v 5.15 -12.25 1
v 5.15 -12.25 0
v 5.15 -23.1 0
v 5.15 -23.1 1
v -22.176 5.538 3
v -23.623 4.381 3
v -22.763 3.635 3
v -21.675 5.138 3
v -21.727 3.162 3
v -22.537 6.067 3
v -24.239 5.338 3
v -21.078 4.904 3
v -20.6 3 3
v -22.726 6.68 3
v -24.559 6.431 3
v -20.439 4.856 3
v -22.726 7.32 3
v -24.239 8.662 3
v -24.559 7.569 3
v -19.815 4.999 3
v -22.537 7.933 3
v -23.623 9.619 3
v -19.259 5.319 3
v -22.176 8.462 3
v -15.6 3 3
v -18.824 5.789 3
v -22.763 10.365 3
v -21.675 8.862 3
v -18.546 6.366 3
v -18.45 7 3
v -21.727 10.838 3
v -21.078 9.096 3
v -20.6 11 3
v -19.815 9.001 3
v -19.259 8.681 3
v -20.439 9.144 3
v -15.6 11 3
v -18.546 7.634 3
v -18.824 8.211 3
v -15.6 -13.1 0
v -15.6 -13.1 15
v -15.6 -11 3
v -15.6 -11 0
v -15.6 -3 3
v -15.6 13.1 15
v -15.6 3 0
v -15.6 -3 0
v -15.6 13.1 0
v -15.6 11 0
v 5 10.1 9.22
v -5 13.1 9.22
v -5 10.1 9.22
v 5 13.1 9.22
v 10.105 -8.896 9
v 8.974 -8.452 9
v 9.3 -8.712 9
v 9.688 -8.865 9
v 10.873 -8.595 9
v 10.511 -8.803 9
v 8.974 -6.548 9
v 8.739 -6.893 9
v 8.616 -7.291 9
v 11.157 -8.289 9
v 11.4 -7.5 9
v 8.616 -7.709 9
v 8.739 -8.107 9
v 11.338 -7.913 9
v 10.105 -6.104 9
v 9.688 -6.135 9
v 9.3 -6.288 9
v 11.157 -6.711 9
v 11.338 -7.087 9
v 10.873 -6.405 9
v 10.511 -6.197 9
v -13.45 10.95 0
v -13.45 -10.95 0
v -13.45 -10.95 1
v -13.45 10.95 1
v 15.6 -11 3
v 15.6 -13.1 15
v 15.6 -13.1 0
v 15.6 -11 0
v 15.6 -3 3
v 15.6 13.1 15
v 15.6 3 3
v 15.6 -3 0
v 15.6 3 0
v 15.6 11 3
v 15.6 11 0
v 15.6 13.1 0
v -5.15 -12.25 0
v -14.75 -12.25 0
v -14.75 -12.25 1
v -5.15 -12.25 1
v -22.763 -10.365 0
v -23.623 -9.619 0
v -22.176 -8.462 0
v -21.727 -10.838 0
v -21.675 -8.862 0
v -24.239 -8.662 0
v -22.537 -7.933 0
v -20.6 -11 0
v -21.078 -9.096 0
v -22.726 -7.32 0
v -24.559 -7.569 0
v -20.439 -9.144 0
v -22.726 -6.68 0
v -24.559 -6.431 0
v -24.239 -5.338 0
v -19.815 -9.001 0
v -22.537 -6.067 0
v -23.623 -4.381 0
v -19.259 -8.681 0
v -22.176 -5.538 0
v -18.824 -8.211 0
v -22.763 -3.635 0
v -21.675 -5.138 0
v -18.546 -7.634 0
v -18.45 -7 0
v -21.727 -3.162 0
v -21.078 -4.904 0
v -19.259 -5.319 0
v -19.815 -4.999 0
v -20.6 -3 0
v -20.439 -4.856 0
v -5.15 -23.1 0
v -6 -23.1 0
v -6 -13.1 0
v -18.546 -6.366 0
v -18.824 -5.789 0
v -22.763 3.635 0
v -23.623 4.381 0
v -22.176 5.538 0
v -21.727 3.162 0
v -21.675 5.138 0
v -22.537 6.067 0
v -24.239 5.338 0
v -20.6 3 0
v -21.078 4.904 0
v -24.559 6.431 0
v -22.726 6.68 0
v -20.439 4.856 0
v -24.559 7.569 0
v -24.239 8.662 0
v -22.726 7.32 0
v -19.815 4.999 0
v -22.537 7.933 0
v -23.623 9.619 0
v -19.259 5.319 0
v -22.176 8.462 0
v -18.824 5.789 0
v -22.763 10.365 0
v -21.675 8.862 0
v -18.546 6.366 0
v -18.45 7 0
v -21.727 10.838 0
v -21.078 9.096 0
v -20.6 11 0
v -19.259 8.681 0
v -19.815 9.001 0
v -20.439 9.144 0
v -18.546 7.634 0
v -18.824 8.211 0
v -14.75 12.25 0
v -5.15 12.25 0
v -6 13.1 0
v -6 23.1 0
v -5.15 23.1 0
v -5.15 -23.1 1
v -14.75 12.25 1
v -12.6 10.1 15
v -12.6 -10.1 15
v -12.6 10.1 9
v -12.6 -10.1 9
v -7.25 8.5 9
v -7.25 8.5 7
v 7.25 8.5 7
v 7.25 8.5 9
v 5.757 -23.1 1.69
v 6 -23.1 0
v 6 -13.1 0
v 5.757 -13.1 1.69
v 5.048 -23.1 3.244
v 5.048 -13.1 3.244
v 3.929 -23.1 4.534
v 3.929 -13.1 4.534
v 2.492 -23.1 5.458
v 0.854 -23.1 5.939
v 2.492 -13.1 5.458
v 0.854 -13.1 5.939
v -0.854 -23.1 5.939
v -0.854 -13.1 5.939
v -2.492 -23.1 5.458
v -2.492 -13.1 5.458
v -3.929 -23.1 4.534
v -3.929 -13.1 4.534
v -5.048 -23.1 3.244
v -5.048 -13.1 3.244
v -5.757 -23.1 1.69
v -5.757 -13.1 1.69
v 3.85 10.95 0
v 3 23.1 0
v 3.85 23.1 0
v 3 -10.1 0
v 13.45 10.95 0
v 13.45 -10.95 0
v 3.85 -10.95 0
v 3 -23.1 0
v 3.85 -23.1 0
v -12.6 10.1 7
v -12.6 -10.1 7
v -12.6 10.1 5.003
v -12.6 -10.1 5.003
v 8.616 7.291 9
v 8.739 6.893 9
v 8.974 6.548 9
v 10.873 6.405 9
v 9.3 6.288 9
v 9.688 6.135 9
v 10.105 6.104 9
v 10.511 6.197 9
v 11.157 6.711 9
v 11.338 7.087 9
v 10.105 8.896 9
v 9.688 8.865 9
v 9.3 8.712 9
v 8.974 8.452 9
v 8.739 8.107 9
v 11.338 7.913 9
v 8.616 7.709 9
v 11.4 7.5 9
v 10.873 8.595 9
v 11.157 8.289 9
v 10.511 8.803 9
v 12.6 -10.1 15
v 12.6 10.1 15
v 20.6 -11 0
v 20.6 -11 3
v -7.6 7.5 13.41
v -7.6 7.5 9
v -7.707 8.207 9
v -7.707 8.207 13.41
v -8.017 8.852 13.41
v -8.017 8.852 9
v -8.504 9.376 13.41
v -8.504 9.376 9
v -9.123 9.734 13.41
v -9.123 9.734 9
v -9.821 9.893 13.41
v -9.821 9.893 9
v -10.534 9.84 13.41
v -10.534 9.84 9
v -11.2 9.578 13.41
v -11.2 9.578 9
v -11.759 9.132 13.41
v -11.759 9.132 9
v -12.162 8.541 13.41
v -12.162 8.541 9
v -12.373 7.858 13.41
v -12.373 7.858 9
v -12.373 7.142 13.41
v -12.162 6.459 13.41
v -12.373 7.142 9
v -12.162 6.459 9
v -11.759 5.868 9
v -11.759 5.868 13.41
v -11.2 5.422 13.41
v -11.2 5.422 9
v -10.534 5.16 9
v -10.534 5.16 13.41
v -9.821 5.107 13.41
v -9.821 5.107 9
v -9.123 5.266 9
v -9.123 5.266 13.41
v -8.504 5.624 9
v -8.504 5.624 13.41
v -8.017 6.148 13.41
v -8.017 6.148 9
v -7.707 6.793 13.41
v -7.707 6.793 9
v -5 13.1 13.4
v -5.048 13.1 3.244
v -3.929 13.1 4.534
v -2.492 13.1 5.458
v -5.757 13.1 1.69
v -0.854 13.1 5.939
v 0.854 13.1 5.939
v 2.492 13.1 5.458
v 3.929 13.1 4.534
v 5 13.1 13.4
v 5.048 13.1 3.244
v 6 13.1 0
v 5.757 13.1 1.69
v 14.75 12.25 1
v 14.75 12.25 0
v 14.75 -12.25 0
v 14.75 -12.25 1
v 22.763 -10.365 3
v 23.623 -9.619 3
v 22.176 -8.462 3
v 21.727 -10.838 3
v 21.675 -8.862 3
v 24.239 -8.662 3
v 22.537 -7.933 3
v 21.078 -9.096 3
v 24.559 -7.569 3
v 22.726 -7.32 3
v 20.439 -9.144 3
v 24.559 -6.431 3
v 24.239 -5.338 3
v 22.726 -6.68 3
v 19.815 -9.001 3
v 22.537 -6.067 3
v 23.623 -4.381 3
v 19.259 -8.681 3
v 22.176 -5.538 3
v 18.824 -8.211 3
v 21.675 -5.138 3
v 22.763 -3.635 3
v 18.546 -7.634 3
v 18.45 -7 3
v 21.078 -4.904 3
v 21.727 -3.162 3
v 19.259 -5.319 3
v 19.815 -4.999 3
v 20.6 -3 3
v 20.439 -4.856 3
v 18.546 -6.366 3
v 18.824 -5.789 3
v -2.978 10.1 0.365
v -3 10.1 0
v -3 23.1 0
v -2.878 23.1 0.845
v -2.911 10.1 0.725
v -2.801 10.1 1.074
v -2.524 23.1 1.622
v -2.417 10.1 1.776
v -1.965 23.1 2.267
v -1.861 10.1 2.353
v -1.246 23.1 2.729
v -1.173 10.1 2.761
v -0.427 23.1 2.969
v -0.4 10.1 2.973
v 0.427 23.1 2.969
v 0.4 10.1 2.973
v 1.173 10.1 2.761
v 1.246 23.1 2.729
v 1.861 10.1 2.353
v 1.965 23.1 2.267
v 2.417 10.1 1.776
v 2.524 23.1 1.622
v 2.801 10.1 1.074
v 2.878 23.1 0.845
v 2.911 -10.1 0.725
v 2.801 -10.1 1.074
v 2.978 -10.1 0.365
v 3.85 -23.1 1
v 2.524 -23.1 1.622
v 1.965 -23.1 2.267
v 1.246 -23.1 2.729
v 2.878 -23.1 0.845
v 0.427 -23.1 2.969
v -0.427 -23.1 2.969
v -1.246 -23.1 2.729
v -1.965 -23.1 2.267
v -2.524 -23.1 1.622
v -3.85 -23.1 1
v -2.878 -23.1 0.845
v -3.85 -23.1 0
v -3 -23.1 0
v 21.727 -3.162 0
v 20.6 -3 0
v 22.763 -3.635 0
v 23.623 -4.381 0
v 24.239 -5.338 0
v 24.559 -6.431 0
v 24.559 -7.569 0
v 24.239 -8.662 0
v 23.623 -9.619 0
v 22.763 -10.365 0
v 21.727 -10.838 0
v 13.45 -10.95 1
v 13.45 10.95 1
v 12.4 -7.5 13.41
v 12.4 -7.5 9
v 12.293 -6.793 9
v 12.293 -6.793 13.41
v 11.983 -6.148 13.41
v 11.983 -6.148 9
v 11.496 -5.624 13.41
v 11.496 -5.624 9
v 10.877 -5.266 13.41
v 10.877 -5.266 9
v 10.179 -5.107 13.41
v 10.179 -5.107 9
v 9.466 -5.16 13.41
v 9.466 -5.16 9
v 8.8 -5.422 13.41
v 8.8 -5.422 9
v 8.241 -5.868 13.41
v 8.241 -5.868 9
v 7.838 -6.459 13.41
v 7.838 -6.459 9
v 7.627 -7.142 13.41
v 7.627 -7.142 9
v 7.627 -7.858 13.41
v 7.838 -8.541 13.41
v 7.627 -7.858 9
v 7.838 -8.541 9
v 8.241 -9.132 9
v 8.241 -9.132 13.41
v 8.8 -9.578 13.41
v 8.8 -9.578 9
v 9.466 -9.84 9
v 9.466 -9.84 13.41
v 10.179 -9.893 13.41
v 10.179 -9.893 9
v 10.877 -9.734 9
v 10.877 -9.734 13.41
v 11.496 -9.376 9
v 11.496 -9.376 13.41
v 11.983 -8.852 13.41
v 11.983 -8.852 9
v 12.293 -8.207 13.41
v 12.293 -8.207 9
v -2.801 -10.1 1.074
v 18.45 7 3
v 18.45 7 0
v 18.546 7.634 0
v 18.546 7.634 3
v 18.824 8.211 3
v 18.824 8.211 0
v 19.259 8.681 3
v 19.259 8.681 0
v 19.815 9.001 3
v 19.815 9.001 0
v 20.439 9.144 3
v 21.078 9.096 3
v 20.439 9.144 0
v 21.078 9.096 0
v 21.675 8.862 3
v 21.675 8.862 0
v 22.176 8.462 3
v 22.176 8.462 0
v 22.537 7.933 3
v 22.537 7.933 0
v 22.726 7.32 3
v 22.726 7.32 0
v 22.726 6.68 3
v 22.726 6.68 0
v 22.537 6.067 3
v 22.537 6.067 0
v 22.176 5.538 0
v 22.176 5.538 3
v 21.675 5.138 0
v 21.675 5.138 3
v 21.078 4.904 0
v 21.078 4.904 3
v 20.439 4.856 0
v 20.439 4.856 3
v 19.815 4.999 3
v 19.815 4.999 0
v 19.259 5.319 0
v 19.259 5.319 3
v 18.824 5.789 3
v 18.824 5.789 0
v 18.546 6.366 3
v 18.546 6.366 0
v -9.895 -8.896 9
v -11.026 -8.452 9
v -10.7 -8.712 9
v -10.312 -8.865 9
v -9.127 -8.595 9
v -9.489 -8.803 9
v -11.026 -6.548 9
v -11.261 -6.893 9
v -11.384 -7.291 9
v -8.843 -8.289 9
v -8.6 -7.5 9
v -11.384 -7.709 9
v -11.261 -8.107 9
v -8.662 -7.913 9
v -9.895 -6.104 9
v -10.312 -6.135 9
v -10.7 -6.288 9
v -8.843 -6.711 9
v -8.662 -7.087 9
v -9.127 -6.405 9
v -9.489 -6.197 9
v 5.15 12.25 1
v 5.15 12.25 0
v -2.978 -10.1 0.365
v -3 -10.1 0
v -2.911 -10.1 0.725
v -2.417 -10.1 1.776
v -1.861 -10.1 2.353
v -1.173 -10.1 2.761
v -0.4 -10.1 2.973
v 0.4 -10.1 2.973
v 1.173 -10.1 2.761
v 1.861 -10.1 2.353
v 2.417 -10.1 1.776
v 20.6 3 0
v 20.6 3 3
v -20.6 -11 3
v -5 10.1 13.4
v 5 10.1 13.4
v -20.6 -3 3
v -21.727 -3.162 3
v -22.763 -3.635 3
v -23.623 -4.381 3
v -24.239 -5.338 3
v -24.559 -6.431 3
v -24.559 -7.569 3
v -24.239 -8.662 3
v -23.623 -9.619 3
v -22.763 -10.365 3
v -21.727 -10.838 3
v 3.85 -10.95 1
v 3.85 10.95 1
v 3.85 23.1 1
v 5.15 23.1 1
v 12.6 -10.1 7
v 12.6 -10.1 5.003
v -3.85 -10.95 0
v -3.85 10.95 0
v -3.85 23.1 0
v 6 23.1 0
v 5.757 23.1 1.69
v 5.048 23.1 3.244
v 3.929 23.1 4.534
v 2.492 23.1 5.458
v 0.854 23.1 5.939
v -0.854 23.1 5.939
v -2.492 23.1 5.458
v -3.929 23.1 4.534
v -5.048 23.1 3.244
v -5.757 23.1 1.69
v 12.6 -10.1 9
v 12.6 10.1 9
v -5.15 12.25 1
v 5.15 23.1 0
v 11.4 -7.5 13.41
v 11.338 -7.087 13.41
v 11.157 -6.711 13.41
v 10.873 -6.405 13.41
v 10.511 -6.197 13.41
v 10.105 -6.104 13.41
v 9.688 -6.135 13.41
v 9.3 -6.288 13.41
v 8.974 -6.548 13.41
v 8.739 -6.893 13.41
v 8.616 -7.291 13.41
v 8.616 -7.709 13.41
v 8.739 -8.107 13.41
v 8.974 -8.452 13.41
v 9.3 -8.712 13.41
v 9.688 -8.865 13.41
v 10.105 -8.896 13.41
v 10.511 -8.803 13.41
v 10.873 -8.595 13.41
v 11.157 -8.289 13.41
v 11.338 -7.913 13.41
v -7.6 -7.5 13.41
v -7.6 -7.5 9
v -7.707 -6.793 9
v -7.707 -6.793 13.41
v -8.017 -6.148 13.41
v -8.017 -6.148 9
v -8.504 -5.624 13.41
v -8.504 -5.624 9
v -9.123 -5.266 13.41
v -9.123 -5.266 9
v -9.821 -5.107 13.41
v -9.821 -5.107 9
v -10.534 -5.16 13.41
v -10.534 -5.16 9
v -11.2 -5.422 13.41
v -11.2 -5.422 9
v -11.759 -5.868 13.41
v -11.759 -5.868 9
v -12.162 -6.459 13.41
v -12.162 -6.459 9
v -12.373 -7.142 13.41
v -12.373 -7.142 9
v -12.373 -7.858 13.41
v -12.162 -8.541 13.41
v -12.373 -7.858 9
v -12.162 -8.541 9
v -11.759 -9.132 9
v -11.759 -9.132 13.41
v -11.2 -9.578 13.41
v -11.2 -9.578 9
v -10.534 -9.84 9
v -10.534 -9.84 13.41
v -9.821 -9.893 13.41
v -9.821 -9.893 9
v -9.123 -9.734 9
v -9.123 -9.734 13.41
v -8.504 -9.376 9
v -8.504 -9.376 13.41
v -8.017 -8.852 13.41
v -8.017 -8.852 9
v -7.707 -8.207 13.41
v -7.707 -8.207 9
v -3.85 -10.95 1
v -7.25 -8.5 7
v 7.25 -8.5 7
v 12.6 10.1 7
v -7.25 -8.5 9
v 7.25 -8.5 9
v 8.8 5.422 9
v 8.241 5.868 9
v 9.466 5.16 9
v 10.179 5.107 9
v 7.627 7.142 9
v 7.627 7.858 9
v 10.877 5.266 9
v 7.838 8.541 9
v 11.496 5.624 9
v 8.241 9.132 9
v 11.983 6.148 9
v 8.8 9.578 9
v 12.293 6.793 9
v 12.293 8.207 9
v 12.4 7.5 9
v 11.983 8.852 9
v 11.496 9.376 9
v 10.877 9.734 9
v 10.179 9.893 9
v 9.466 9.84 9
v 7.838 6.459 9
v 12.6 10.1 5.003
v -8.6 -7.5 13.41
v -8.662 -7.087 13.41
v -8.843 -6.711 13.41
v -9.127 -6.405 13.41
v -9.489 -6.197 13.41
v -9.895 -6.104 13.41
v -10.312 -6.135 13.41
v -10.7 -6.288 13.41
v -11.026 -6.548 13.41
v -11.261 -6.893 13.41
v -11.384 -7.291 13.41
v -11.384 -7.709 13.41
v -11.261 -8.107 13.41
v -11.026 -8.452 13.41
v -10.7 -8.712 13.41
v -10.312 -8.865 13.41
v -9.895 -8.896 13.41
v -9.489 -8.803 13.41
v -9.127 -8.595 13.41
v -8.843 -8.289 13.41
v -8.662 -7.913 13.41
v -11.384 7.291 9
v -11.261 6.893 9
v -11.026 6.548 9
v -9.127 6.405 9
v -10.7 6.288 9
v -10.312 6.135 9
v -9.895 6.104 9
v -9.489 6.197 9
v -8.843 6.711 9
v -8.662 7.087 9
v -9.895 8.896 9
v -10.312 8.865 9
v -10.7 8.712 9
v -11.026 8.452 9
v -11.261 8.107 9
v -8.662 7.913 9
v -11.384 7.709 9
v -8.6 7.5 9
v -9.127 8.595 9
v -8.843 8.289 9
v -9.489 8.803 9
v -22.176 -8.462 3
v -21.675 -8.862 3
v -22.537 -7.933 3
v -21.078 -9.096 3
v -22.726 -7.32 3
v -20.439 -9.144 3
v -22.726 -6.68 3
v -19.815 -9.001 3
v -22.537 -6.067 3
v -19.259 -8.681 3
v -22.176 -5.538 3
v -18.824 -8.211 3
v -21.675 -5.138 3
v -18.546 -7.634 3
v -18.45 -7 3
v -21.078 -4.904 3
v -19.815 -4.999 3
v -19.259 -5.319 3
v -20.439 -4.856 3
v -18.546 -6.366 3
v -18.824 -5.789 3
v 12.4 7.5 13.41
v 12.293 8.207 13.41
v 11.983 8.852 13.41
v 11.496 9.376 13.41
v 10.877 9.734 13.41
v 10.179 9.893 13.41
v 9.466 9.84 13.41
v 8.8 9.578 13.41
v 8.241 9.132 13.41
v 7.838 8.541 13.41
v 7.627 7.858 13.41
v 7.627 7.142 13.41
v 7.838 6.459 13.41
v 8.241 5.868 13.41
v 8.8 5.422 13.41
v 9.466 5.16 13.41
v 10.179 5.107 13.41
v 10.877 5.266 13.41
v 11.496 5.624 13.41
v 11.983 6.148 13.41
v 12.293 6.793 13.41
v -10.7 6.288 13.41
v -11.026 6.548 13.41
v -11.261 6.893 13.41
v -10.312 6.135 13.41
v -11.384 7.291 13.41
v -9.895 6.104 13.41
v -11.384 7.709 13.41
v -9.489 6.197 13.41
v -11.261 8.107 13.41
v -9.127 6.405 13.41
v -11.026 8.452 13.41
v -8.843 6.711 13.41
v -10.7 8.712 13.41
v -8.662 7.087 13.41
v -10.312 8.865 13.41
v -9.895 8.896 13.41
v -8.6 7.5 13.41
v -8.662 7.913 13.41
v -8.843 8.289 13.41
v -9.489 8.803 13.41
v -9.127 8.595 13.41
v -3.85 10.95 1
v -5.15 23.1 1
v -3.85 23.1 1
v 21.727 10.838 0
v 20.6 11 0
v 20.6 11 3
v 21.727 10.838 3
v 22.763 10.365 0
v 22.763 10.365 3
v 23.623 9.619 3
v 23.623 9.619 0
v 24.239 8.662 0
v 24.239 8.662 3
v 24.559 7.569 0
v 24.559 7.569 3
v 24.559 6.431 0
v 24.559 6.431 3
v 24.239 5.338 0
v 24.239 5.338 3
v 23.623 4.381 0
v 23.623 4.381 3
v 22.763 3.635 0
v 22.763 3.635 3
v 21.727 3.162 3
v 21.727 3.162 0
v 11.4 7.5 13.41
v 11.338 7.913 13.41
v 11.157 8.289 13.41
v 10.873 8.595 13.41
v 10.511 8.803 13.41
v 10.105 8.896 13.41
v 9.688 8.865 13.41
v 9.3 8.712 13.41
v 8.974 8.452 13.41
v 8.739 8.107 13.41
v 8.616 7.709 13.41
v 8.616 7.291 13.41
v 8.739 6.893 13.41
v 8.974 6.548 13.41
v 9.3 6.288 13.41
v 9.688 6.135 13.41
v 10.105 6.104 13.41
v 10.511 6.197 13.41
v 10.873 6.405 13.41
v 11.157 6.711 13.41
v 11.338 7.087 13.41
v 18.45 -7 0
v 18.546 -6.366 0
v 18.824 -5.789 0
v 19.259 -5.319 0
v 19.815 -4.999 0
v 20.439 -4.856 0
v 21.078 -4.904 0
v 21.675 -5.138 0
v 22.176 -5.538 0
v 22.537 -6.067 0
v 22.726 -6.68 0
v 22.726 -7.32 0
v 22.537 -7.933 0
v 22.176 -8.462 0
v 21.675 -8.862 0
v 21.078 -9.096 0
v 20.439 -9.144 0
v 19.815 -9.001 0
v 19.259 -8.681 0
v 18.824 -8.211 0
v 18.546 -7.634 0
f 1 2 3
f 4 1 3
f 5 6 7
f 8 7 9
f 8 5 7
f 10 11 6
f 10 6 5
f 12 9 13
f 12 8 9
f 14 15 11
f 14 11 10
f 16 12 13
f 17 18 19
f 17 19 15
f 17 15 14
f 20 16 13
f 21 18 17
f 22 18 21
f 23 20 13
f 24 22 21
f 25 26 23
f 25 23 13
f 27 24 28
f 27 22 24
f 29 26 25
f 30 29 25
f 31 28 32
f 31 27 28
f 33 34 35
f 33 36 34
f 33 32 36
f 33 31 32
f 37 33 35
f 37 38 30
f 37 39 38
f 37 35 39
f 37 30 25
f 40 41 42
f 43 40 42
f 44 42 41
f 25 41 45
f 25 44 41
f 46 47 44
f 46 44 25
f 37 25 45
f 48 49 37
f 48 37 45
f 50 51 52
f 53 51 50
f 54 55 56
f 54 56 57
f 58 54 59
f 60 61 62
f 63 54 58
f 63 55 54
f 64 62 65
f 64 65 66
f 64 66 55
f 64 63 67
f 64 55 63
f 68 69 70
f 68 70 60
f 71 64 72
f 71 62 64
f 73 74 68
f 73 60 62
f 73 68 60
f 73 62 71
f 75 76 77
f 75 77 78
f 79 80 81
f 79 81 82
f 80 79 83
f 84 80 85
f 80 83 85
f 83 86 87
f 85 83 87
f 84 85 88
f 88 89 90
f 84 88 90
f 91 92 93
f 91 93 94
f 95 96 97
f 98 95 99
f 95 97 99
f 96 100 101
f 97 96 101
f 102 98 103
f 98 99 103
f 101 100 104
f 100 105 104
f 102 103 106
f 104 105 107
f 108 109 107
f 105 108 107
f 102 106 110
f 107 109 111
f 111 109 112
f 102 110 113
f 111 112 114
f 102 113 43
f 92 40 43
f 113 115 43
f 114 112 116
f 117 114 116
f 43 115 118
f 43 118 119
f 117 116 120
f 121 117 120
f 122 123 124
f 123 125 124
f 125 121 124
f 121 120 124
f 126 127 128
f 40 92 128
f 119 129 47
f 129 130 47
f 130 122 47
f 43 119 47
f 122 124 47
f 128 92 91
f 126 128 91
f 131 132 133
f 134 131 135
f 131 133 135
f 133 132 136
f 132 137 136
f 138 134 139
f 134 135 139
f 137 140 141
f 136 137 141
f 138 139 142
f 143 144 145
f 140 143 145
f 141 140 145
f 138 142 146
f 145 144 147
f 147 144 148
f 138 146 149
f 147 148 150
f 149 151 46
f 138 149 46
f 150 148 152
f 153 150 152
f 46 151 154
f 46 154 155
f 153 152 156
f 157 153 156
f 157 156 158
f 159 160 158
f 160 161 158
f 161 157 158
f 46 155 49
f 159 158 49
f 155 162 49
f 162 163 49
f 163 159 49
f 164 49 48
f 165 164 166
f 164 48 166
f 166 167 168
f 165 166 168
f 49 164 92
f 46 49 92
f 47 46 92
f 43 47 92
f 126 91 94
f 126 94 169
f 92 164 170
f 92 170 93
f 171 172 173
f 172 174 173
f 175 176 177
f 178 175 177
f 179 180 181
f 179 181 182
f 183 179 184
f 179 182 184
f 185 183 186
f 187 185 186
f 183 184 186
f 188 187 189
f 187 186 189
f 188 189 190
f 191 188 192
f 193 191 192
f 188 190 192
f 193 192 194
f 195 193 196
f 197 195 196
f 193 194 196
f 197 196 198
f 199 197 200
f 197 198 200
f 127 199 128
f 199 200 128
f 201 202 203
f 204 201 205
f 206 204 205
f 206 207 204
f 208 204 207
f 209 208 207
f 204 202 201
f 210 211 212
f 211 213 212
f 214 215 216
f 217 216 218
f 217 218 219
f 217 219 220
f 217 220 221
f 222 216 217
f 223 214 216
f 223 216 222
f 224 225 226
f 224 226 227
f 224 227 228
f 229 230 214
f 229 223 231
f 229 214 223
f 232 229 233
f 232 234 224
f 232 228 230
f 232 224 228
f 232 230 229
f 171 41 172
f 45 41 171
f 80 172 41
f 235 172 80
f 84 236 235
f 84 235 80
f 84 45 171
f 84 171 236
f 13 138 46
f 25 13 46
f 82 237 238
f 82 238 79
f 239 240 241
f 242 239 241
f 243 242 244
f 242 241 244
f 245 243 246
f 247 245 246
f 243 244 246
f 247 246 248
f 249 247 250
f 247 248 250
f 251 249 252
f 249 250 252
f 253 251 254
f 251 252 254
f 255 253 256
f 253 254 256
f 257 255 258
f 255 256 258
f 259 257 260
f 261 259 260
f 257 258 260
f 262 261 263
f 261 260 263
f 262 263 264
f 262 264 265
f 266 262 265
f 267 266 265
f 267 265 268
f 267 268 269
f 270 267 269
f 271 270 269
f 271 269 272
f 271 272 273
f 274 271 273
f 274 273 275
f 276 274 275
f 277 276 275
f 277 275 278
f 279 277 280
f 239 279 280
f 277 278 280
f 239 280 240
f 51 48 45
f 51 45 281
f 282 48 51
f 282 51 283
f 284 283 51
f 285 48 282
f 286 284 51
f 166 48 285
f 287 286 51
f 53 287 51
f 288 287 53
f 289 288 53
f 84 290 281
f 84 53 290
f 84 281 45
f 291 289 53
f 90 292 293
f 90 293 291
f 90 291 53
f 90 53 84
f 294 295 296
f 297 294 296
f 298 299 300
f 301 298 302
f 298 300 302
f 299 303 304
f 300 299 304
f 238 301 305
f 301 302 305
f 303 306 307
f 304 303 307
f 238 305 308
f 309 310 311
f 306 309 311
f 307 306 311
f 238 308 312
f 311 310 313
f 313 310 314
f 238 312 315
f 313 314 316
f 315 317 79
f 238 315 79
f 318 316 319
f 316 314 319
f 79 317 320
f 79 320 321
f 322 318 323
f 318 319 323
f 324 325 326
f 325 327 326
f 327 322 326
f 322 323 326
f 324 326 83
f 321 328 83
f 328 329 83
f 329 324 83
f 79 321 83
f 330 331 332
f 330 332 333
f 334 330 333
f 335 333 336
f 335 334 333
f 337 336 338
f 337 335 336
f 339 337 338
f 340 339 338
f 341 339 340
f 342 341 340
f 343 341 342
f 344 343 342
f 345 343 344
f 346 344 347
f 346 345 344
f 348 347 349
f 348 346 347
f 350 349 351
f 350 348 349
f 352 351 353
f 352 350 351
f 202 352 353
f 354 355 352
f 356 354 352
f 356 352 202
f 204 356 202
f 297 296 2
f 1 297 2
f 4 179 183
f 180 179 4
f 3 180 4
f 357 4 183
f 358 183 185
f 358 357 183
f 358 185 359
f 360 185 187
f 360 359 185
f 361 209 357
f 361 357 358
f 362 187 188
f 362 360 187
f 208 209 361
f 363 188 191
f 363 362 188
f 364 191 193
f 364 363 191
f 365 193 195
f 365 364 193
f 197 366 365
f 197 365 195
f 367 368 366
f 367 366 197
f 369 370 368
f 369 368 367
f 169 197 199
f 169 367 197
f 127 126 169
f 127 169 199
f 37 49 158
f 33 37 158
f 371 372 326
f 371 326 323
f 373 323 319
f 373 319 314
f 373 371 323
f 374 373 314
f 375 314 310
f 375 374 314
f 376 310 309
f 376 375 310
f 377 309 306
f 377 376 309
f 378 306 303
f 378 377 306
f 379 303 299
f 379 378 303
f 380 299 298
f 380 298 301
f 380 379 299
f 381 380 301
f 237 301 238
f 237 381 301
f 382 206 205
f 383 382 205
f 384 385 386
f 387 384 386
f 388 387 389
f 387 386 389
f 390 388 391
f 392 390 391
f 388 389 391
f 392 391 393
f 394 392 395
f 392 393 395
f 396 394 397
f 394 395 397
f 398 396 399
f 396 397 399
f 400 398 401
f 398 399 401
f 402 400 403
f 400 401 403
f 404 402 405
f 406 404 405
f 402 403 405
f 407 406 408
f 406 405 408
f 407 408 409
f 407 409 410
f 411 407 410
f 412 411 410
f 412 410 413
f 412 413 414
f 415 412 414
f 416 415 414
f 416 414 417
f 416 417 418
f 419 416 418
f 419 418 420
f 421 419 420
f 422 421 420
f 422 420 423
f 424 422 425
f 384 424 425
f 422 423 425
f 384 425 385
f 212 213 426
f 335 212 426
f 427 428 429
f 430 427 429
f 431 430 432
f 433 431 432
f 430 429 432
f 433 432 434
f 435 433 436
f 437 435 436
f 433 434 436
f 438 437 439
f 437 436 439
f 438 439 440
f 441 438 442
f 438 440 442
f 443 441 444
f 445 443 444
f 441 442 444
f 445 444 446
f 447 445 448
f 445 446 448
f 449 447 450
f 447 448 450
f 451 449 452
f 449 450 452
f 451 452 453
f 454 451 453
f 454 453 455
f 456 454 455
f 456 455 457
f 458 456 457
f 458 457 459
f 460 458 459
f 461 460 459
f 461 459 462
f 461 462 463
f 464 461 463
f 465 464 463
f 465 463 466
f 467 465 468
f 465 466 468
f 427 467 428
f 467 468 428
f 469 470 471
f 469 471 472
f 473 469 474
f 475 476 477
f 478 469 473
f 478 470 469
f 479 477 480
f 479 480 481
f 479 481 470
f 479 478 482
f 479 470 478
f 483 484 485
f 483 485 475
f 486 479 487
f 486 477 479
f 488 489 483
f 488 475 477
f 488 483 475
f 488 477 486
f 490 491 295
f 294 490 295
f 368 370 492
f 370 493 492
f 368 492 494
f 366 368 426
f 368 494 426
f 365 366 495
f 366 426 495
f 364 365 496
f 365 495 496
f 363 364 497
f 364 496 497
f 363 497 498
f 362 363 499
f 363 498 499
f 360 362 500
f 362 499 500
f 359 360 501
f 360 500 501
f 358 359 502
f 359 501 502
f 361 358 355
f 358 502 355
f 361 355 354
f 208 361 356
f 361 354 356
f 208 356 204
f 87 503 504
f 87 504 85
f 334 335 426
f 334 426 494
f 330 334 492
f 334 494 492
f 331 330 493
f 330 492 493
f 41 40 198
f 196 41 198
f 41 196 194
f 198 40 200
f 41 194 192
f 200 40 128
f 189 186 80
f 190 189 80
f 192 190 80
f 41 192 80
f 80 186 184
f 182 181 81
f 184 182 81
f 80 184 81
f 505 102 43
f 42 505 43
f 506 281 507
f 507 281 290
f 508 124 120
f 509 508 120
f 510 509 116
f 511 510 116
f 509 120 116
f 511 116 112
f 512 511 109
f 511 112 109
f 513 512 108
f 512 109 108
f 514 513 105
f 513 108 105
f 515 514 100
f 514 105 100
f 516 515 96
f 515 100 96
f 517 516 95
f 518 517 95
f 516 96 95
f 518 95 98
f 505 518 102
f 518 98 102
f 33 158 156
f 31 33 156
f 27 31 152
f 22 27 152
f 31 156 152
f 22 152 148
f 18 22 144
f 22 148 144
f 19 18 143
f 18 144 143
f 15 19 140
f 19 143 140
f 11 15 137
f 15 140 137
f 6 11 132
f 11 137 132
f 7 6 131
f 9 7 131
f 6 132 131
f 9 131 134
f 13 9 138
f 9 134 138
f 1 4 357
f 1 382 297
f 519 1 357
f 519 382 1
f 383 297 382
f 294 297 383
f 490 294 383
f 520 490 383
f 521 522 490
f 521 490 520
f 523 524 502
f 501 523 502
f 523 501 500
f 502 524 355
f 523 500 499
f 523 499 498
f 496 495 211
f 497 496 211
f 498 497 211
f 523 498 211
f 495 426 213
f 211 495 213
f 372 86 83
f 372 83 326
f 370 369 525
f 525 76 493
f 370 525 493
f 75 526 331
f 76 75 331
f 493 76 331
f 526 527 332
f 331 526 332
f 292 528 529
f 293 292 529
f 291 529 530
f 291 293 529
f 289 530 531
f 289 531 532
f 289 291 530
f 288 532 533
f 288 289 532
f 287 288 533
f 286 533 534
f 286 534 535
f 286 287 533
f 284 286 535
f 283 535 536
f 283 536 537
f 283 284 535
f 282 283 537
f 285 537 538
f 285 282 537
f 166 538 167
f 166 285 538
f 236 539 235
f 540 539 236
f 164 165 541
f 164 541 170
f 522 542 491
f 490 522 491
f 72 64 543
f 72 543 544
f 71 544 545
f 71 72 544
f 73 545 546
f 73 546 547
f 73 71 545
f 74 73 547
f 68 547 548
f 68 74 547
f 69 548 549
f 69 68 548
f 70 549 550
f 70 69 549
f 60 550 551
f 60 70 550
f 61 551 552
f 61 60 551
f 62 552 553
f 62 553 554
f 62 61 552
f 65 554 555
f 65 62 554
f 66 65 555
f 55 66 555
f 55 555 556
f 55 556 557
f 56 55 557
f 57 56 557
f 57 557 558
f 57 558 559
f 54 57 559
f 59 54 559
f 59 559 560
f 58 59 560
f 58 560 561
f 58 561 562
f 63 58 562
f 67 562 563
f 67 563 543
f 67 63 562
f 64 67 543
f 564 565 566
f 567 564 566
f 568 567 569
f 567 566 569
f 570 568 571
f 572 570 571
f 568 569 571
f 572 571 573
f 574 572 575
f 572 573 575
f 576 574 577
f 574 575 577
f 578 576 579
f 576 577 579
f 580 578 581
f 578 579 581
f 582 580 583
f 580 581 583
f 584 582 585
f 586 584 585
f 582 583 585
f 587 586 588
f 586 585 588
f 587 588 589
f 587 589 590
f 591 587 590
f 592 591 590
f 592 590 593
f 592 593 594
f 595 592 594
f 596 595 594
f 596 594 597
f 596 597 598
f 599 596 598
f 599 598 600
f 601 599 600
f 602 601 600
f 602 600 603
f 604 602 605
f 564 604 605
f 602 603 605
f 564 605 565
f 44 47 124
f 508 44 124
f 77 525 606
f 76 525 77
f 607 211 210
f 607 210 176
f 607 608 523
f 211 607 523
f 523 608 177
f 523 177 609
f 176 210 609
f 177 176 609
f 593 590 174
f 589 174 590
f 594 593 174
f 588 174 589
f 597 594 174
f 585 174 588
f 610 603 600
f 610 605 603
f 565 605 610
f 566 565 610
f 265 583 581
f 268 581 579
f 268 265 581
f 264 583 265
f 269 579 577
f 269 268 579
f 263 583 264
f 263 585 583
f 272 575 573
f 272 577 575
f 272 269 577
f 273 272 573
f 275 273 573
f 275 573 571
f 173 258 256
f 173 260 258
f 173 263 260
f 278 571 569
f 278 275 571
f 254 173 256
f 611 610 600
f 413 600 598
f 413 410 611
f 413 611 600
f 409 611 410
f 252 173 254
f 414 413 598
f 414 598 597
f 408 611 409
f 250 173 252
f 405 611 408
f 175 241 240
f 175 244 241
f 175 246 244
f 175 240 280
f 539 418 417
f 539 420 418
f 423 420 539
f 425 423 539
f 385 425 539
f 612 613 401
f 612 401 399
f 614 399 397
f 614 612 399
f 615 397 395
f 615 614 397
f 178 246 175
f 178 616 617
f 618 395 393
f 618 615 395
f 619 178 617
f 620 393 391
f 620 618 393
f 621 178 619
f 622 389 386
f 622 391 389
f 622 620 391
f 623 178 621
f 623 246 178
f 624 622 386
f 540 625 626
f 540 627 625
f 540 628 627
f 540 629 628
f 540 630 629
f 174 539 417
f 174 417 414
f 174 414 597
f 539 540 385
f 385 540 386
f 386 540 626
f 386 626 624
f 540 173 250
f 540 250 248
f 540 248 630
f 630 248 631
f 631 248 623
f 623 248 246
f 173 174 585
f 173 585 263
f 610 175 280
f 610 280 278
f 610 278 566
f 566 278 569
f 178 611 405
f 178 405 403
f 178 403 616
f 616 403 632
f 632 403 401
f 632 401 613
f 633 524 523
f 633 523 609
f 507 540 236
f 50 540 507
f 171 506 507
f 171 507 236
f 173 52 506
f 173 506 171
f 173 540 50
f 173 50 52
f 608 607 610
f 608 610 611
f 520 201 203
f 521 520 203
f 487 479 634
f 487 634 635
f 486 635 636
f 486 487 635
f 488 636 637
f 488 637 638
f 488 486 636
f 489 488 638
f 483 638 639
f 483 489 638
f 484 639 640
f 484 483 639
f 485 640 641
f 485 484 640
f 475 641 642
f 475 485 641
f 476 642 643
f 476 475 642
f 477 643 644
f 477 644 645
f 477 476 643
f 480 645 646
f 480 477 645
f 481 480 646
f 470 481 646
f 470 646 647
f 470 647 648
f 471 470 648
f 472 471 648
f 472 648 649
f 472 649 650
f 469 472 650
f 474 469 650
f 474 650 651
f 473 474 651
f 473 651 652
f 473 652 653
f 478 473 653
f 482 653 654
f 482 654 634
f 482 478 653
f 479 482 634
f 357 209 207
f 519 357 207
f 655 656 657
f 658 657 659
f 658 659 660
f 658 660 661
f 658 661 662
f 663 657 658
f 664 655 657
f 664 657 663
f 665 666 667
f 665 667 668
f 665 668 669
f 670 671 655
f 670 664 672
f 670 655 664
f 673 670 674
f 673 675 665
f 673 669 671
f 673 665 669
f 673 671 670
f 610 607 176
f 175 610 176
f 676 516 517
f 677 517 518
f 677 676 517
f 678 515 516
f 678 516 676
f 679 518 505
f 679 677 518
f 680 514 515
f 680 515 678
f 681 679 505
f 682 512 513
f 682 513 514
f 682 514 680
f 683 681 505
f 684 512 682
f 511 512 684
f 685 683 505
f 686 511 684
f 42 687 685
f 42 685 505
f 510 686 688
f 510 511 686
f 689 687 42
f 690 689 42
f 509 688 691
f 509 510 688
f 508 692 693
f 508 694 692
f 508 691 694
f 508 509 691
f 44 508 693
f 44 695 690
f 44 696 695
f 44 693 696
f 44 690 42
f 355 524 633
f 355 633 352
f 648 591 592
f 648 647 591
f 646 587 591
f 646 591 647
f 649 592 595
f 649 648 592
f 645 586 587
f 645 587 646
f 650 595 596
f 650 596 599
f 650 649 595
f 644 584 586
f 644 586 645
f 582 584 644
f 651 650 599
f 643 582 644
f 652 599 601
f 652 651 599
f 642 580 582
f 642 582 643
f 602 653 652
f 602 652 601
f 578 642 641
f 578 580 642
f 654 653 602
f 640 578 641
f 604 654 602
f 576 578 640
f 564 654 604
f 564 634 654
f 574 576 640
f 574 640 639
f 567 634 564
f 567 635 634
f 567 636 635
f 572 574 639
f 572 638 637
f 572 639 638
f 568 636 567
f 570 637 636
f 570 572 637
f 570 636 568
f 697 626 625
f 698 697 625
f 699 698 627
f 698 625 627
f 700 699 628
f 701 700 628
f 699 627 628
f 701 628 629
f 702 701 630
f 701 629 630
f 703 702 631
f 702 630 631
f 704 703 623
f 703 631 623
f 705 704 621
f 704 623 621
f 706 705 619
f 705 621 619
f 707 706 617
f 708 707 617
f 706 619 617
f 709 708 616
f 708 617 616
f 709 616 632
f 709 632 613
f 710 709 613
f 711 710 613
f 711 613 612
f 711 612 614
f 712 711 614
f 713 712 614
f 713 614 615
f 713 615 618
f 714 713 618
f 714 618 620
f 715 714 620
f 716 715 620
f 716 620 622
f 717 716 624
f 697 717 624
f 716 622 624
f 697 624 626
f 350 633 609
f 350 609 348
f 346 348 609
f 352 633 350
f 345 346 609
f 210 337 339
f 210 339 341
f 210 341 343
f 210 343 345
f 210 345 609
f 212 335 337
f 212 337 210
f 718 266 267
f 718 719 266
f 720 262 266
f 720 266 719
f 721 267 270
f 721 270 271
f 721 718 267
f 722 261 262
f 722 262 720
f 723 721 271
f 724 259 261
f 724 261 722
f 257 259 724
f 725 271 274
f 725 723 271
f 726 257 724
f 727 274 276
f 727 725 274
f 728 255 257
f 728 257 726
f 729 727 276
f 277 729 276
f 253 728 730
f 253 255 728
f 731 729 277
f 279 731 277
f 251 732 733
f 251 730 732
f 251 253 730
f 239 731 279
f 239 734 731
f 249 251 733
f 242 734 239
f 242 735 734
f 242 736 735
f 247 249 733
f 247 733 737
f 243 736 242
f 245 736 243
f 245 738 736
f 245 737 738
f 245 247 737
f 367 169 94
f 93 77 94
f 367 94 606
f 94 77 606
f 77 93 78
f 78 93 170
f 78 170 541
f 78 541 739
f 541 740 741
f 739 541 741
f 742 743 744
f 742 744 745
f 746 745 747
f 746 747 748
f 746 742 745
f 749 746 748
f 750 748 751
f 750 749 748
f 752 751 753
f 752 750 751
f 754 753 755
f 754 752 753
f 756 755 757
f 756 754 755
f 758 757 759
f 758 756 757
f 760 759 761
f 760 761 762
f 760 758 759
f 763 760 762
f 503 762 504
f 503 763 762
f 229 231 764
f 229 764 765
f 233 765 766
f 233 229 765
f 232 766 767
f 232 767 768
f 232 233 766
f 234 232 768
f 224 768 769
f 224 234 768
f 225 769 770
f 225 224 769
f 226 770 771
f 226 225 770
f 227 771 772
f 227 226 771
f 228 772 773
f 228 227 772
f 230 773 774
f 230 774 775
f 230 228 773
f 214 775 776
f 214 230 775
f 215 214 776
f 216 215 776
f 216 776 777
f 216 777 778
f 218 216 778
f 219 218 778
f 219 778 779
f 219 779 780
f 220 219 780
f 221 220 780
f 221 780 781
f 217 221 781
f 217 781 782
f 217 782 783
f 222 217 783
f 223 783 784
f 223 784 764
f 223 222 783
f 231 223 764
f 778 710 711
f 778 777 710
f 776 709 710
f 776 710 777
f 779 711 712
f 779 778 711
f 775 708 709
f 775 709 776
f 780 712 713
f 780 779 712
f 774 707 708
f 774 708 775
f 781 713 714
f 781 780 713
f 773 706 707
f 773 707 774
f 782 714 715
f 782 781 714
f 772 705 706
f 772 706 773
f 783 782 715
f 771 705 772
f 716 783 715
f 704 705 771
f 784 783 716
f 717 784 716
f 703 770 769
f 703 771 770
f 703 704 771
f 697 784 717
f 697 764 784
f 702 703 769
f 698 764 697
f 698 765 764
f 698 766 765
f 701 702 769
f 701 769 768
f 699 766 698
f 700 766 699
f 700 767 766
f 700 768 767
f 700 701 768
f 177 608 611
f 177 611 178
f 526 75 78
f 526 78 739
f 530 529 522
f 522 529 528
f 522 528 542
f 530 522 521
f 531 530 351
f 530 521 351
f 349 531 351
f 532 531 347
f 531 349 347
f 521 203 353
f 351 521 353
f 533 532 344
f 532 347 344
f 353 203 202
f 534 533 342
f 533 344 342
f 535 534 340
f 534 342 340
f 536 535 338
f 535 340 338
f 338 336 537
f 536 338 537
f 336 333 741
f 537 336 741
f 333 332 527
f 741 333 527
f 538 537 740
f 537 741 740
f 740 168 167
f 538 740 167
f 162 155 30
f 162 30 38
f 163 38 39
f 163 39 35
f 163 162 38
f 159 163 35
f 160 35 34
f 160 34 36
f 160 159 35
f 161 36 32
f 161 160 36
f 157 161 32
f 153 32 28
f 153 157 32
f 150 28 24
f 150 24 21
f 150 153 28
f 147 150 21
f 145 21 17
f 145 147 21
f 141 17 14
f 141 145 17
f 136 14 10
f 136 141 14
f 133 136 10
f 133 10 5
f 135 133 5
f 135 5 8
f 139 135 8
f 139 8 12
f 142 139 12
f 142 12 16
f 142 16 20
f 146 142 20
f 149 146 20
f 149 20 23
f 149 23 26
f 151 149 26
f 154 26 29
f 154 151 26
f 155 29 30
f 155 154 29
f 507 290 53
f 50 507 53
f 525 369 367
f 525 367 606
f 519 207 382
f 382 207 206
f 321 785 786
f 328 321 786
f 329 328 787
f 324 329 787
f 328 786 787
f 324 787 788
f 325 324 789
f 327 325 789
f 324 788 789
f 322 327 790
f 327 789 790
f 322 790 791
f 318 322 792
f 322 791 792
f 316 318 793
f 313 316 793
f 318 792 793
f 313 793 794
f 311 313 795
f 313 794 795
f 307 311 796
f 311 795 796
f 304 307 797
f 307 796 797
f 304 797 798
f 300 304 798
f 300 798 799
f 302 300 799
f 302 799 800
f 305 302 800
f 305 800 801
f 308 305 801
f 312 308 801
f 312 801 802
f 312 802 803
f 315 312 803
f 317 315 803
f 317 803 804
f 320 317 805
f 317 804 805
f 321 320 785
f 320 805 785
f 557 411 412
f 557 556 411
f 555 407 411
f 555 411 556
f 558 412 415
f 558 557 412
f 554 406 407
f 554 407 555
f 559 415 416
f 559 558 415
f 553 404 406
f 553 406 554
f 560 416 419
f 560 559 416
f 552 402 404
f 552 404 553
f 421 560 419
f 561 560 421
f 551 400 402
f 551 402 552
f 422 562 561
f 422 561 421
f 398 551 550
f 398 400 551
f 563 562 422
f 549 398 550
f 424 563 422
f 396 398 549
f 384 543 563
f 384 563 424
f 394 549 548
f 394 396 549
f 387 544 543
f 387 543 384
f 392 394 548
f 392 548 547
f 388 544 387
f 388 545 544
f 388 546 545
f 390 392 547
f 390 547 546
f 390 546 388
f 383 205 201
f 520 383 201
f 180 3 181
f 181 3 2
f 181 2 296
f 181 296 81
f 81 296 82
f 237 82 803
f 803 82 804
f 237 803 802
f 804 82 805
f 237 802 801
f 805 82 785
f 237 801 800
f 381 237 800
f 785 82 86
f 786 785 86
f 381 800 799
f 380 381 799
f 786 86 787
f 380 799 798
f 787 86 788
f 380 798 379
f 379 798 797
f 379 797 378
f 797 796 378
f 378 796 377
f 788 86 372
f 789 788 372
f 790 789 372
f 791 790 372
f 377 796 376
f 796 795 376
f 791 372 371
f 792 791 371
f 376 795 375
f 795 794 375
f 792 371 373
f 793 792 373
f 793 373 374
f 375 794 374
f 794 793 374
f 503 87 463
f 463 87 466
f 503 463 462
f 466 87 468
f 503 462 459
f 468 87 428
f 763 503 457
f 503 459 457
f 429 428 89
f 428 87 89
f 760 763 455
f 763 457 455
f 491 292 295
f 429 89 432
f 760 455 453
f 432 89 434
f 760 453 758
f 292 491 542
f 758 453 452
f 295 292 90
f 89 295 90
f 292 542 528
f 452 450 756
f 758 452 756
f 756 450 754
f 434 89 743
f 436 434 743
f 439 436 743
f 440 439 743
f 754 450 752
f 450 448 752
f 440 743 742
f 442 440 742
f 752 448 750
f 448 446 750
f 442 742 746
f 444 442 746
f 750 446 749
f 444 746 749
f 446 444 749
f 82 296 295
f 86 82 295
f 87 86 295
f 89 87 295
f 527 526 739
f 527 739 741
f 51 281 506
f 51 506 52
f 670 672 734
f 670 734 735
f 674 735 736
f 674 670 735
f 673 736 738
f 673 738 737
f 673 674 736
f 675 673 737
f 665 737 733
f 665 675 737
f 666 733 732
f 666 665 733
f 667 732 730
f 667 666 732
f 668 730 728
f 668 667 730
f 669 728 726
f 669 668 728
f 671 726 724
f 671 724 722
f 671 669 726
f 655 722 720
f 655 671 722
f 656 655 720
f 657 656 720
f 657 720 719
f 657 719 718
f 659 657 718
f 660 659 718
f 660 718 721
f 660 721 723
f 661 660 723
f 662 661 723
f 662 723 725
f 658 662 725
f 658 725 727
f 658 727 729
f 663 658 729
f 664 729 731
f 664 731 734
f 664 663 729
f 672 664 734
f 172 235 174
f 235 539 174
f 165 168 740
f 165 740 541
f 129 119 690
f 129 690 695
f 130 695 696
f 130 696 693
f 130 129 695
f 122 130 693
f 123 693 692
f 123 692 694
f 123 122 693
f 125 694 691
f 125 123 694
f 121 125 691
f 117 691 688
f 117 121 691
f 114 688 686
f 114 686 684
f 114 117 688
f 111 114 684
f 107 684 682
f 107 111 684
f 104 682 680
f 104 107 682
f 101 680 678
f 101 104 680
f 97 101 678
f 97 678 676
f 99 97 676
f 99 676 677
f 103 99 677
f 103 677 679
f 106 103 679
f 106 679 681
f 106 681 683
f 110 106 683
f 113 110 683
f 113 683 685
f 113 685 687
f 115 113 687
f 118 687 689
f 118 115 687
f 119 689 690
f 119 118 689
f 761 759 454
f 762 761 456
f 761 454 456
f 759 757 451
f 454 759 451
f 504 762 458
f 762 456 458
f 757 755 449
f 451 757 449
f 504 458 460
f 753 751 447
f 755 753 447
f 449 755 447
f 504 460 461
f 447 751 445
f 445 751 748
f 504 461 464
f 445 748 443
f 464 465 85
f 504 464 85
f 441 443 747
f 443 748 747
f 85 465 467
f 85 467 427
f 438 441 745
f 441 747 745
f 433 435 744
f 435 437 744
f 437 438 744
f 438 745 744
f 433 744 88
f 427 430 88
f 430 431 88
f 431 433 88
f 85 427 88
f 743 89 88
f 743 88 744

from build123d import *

# Parameters (mm, degrees)
SKETCH1_W            = 31.2
SKETCH1_H            = 26.2
BOSS_EXTRUDE1_DEPTH  = 15
SHELL2_T             = -3
BOSS_EXTRUDE2_DEPTH  = 10
CUT_EXTRUDE2_DEPTH   = 43.175822458
SKETCH8_R            = 2.15
BOSS_EXTRUDE5_DEPTH  = 3
CUT_EXTRUDE7_DEPTH   = 1
SKETCH14_W           = 25.2
SKETCH14_H           = 20.2
CUT_EXTRUDE5_DEPTH   = 36.815778646
BOSS_EXTRUDE8_REACH  = 45.959
BOSS_EXTRUDE9_START  = -8
SKETCH15_W           = 31.2
SKETCH15_H           = 26.2
SKETCH15_W_2         = 14.5
SKETCH15_H_2         = 17
BOSS_EXTRUDE9_DEPTH  = 2
SKETCH16_R           = 2.4
SKETCH16_R_2         = 1.4
BOSS_EXTRUDE10_DEPTH = 4.41
CUT_EXTRUDE6_REACH   = 48.267
SKETCH5_W            = 10
SKETCH5_H            = 4.18


with BuildPart() as part:
    # Sketch1 → Boss-Extrude1 (new body)
    with BuildSketch(Plane.XY):
        Rectangle(SKETCH1_W, SKETCH1_H)
    extrude(amount=BOSS_EXTRUDE1_DEPTH)

    # Shell2
    shell2_openings = [part.faces().sort_by_distance(p)[0] for p in [
        (0, 0, 0),
    ]]
    offset(amount=SHELL2_T, openings=shell2_openings, kind=Kind.INTERSECTION)

    # Sketch3 → Boss-Extrude2 (add)
    with BuildSketch(Plane(origin=(0, 13.1, 0), x_dir=(1, 0, 0), z_dir=(0, 1, 0))):
        with BuildLine():
            Line((-6, 0), (-3, 0))
            ThreePointArc((-3, 0), (0, -3), (3, 0))
            Line((3, 0), (6, 0))
            ThreePointArc((6, 0), (0, -6), (-6, 0))
        make_face()
    boss_extrude2 = extrude(amount=BOSS_EXTRUDE2_DEPTH)

    # Mirror1: Boss-Extrude2 across plane
    add(boss_extrude2.mirror(Plane.ZX))

    # Sketch4 → Cut-Extrude2 (cut, through all)
    with BuildSketch(Plane(origin=(0, 13.1, 0), x_dir=(1, 0, 0), z_dir=(0, 1, 0))):
        with BuildLine():
            Line((-3, 0), (3, 0))
            ThreePointArc((3, 0), (0, -3), (-3, 0))
        make_face()
    extrude(amount=-CUT_EXTRUDE2_DEPTH, mode=Mode.SUBTRACT)

    # Sketch8 → Boss-Extrude5 (add)
    # profile 1 of 2: a face of its own
    with BuildSketch(Plane(origin=(0, 0, 0), x_dir=(-1, 0, 0), z_dir=(0, 0, -1))):
        with BuildLine():
            Line((-15.6, 3), (-15.6, 11))
            Line((-15.6, 11), (-20.6, 11))
            ThreePointArc((-20.6, 11), (-24.6, 7), (-20.6, 3))
            Line((-20.6, 3), (-15.6, 3))
        make_face()
        with Locations((-20.6, 7)):
            Circle(SKETCH8_R, mode=Mode.SUBTRACT)
    # profile 2 of 2: a face of its own
    with BuildSketch(Plane(origin=(0, 0, 0), x_dir=(-1, 0, 0), z_dir=(0, 0, -1))):
        with BuildLine():
            Line((-15.6, -11), (-15.6, -3))
            Line((-15.6, -3), (-20.6, -3))
            ThreePointArc((-20.6, -3), (-24.6, -7), (-20.6, -11))
            Line((-20.6, -11), (-15.6, -11))
        make_face()
        with Locations((-20.6, -7)):
            Circle(SKETCH8_R, mode=Mode.SUBTRACT)
    boss_extrude5 = extrude(amount=-BOSS_EXTRUDE5_DEPTH)

    # Sketch7 → Cut-Extrude7 (cut)
    with BuildSketch(Plane(origin=(0, 0, 0), x_dir=(-1, 0, 0), z_dir=(0, 0, -1))):
        Polygon((-3.85, -23.1), (-3.85, -10.95), (-13.45, -10.95), (-13.45, 10.95), (-3.85, 10.95), (-3.85, 23.1), (-5.15, 23.1), (-5.15, 12.25), (-14.75, 12.25), (-14.75, -12.25), (-5.15, -12.25), (-5.15, -23.1), align=None)
    cut_extrude7 = extrude(amount=-CUT_EXTRUDE7_DEPTH, mode=Mode.SUBTRACT)

    # Mirror3: Boss-Extrude5, Cut-Extrude7 across plane
    add(boss_extrude5.mirror(Plane(origin=(0, 0, 0), x_dir=(0, 0, 1), z_dir=(1, 0, 0))))
    add(cut_extrude7.mirror(Plane(origin=(0, 0, 0), x_dir=(0, 0, 1), z_dir=(1, 0, 0))), mode=Mode.SUBTRACT)

    # Sketch14 → Cut-Extrude5 (cut, through all)
    with BuildSketch(Plane(origin=(0, 0, 12), x_dir=(-1, 0, 0), z_dir=(0, 0, -1))):
        Rectangle(SKETCH14_W, SKETCH14_H)
    extrude(amount=-CUT_EXTRUDE5_DEPTH, mode=Mode.SUBTRACT)

    # Sketch11 → Boss-Extrude8 (add, up to next)
    with BuildSketch(Plane(origin=(0, -10.1, 0), x_dir=(1, 0, 0), z_dir=(0, 1, 0)), mode=Mode.PRIVATE) as boss_extrude8_sk1:
        with BuildLine():
            Line((3, 0), (12.6, 0))
            Line((12.6, 0), (12.6, -5.002969955))
            Line((12.6, -5.002969955), (2.801311304, -1.073617705))
            ThreePointArc((2.801311304, -1.073617705), (2.949909652, -0.545924027), (3, 0))
        make_face()
    boss_extrude8_tool1 = extrude(boss_extrude8_sk1.sketch, amount=BOSS_EXTRUDE8_REACH, mode=Mode.PRIVATE) - part.part
    # Sketch11 → Boss-Extrude8 (add, up to next)
    with BuildSketch(Plane(origin=(0, -10.1, 0), x_dir=(1, 0, 0), z_dir=(0, 1, 0)), mode=Mode.PRIVATE) as boss_extrude8_sk2:
        with BuildLine():
            Line((-12.6, -5.002969955), (-2.801311304, -1.073617705))
            ThreePointArc((-2.801311304, -1.073617705), (-2.949909652, -0.545924027), (-3, 0))
            Line((-3, 0), (-12.6, 0))
            Line((-12.6, 0), (-12.6, -5.002969955))
        make_face()
    boss_extrude8_tool2 = extrude(boss_extrude8_sk2.sketch, amount=BOSS_EXTRUDE8_REACH, mode=Mode.PRIVATE) - part.part
    add(boss_extrude8_tool1.solids().sort_by_distance((8.785084, -10.1, 1.737296))[0])
    add(boss_extrude8_tool2.solids().sort_by_distance((-8.785084, -10.1, 1.737296))[0])

    # Sketch15 → Boss-Extrude9 (add)
    with BuildSketch(Plane.XY.offset(15).offset(BOSS_EXTRUDE9_START)):
        Rectangle(SKETCH15_W, SKETCH15_H)
        Rectangle(SKETCH15_W_2, SKETCH15_H_2, mode=Mode.SUBTRACT)
    extrude(amount=BOSS_EXTRUDE9_DEPTH)

    # Sketch16 → Boss-Extrude10 (add)
    # profile 1 of 4: a face of its own
    with BuildSketch(Plane.XY.offset(9)):
        with Locations((-10, 7.5)):
            Circle(SKETCH16_R)
        with Locations((-10, 7.5)):
            Circle(SKETCH16_R_2, mode=Mode.SUBTRACT)
    # profile 2 of 4: a face of its own
    with BuildSketch(Plane.XY.offset(9)):
        with Locations((10, 7.5)):
            Circle(SKETCH16_R)
        with Locations((10, 7.5)):
            Circle(SKETCH16_R_2, mode=Mode.SUBTRACT)
    # profile 3 of 4: a face of its own
    with BuildSketch(Plane.XY.offset(9)):
        with Locations((-10, -7.5)):
            Circle(SKETCH16_R)
        with Locations((-10, -7.5)):
            Circle(SKETCH16_R_2, mode=Mode.SUBTRACT)
    # profile 4 of 4: a face of its own
    with BuildSketch(Plane.XY.offset(9)):
        with Locations((10, -7.5)):
            Circle(SKETCH16_R)
        with Locations((10, -7.5)):
            Circle(SKETCH16_R_2, mode=Mode.SUBTRACT)
    extrude(amount=BOSS_EXTRUDE10_DEPTH)

    # Sketch5 → Cut-Extrude6 (cut, up to next)
    with BuildSketch(Plane(origin=(0, 13.1, 0), x_dir=(1, 0, 0), z_dir=(0, 1, 0)), mode=Mode.PRIVATE) as cut_extrude6_sk1:
        with Locations((0, -11.31)):
            Rectangle(SKETCH5_W, SKETCH5_H)
    cut_extrude6_tool1 = extrude(cut_extrude6_sk1.sketch, amount=-CUT_EXTRUDE6_REACH, mode=Mode.PRIVATE) & part.part
    add(cut_extrude6_tool1.solids().sort_by_distance((0, 13.1, 11.31))[0], mode=Mode.SUBTRACT)


solid = part.part
